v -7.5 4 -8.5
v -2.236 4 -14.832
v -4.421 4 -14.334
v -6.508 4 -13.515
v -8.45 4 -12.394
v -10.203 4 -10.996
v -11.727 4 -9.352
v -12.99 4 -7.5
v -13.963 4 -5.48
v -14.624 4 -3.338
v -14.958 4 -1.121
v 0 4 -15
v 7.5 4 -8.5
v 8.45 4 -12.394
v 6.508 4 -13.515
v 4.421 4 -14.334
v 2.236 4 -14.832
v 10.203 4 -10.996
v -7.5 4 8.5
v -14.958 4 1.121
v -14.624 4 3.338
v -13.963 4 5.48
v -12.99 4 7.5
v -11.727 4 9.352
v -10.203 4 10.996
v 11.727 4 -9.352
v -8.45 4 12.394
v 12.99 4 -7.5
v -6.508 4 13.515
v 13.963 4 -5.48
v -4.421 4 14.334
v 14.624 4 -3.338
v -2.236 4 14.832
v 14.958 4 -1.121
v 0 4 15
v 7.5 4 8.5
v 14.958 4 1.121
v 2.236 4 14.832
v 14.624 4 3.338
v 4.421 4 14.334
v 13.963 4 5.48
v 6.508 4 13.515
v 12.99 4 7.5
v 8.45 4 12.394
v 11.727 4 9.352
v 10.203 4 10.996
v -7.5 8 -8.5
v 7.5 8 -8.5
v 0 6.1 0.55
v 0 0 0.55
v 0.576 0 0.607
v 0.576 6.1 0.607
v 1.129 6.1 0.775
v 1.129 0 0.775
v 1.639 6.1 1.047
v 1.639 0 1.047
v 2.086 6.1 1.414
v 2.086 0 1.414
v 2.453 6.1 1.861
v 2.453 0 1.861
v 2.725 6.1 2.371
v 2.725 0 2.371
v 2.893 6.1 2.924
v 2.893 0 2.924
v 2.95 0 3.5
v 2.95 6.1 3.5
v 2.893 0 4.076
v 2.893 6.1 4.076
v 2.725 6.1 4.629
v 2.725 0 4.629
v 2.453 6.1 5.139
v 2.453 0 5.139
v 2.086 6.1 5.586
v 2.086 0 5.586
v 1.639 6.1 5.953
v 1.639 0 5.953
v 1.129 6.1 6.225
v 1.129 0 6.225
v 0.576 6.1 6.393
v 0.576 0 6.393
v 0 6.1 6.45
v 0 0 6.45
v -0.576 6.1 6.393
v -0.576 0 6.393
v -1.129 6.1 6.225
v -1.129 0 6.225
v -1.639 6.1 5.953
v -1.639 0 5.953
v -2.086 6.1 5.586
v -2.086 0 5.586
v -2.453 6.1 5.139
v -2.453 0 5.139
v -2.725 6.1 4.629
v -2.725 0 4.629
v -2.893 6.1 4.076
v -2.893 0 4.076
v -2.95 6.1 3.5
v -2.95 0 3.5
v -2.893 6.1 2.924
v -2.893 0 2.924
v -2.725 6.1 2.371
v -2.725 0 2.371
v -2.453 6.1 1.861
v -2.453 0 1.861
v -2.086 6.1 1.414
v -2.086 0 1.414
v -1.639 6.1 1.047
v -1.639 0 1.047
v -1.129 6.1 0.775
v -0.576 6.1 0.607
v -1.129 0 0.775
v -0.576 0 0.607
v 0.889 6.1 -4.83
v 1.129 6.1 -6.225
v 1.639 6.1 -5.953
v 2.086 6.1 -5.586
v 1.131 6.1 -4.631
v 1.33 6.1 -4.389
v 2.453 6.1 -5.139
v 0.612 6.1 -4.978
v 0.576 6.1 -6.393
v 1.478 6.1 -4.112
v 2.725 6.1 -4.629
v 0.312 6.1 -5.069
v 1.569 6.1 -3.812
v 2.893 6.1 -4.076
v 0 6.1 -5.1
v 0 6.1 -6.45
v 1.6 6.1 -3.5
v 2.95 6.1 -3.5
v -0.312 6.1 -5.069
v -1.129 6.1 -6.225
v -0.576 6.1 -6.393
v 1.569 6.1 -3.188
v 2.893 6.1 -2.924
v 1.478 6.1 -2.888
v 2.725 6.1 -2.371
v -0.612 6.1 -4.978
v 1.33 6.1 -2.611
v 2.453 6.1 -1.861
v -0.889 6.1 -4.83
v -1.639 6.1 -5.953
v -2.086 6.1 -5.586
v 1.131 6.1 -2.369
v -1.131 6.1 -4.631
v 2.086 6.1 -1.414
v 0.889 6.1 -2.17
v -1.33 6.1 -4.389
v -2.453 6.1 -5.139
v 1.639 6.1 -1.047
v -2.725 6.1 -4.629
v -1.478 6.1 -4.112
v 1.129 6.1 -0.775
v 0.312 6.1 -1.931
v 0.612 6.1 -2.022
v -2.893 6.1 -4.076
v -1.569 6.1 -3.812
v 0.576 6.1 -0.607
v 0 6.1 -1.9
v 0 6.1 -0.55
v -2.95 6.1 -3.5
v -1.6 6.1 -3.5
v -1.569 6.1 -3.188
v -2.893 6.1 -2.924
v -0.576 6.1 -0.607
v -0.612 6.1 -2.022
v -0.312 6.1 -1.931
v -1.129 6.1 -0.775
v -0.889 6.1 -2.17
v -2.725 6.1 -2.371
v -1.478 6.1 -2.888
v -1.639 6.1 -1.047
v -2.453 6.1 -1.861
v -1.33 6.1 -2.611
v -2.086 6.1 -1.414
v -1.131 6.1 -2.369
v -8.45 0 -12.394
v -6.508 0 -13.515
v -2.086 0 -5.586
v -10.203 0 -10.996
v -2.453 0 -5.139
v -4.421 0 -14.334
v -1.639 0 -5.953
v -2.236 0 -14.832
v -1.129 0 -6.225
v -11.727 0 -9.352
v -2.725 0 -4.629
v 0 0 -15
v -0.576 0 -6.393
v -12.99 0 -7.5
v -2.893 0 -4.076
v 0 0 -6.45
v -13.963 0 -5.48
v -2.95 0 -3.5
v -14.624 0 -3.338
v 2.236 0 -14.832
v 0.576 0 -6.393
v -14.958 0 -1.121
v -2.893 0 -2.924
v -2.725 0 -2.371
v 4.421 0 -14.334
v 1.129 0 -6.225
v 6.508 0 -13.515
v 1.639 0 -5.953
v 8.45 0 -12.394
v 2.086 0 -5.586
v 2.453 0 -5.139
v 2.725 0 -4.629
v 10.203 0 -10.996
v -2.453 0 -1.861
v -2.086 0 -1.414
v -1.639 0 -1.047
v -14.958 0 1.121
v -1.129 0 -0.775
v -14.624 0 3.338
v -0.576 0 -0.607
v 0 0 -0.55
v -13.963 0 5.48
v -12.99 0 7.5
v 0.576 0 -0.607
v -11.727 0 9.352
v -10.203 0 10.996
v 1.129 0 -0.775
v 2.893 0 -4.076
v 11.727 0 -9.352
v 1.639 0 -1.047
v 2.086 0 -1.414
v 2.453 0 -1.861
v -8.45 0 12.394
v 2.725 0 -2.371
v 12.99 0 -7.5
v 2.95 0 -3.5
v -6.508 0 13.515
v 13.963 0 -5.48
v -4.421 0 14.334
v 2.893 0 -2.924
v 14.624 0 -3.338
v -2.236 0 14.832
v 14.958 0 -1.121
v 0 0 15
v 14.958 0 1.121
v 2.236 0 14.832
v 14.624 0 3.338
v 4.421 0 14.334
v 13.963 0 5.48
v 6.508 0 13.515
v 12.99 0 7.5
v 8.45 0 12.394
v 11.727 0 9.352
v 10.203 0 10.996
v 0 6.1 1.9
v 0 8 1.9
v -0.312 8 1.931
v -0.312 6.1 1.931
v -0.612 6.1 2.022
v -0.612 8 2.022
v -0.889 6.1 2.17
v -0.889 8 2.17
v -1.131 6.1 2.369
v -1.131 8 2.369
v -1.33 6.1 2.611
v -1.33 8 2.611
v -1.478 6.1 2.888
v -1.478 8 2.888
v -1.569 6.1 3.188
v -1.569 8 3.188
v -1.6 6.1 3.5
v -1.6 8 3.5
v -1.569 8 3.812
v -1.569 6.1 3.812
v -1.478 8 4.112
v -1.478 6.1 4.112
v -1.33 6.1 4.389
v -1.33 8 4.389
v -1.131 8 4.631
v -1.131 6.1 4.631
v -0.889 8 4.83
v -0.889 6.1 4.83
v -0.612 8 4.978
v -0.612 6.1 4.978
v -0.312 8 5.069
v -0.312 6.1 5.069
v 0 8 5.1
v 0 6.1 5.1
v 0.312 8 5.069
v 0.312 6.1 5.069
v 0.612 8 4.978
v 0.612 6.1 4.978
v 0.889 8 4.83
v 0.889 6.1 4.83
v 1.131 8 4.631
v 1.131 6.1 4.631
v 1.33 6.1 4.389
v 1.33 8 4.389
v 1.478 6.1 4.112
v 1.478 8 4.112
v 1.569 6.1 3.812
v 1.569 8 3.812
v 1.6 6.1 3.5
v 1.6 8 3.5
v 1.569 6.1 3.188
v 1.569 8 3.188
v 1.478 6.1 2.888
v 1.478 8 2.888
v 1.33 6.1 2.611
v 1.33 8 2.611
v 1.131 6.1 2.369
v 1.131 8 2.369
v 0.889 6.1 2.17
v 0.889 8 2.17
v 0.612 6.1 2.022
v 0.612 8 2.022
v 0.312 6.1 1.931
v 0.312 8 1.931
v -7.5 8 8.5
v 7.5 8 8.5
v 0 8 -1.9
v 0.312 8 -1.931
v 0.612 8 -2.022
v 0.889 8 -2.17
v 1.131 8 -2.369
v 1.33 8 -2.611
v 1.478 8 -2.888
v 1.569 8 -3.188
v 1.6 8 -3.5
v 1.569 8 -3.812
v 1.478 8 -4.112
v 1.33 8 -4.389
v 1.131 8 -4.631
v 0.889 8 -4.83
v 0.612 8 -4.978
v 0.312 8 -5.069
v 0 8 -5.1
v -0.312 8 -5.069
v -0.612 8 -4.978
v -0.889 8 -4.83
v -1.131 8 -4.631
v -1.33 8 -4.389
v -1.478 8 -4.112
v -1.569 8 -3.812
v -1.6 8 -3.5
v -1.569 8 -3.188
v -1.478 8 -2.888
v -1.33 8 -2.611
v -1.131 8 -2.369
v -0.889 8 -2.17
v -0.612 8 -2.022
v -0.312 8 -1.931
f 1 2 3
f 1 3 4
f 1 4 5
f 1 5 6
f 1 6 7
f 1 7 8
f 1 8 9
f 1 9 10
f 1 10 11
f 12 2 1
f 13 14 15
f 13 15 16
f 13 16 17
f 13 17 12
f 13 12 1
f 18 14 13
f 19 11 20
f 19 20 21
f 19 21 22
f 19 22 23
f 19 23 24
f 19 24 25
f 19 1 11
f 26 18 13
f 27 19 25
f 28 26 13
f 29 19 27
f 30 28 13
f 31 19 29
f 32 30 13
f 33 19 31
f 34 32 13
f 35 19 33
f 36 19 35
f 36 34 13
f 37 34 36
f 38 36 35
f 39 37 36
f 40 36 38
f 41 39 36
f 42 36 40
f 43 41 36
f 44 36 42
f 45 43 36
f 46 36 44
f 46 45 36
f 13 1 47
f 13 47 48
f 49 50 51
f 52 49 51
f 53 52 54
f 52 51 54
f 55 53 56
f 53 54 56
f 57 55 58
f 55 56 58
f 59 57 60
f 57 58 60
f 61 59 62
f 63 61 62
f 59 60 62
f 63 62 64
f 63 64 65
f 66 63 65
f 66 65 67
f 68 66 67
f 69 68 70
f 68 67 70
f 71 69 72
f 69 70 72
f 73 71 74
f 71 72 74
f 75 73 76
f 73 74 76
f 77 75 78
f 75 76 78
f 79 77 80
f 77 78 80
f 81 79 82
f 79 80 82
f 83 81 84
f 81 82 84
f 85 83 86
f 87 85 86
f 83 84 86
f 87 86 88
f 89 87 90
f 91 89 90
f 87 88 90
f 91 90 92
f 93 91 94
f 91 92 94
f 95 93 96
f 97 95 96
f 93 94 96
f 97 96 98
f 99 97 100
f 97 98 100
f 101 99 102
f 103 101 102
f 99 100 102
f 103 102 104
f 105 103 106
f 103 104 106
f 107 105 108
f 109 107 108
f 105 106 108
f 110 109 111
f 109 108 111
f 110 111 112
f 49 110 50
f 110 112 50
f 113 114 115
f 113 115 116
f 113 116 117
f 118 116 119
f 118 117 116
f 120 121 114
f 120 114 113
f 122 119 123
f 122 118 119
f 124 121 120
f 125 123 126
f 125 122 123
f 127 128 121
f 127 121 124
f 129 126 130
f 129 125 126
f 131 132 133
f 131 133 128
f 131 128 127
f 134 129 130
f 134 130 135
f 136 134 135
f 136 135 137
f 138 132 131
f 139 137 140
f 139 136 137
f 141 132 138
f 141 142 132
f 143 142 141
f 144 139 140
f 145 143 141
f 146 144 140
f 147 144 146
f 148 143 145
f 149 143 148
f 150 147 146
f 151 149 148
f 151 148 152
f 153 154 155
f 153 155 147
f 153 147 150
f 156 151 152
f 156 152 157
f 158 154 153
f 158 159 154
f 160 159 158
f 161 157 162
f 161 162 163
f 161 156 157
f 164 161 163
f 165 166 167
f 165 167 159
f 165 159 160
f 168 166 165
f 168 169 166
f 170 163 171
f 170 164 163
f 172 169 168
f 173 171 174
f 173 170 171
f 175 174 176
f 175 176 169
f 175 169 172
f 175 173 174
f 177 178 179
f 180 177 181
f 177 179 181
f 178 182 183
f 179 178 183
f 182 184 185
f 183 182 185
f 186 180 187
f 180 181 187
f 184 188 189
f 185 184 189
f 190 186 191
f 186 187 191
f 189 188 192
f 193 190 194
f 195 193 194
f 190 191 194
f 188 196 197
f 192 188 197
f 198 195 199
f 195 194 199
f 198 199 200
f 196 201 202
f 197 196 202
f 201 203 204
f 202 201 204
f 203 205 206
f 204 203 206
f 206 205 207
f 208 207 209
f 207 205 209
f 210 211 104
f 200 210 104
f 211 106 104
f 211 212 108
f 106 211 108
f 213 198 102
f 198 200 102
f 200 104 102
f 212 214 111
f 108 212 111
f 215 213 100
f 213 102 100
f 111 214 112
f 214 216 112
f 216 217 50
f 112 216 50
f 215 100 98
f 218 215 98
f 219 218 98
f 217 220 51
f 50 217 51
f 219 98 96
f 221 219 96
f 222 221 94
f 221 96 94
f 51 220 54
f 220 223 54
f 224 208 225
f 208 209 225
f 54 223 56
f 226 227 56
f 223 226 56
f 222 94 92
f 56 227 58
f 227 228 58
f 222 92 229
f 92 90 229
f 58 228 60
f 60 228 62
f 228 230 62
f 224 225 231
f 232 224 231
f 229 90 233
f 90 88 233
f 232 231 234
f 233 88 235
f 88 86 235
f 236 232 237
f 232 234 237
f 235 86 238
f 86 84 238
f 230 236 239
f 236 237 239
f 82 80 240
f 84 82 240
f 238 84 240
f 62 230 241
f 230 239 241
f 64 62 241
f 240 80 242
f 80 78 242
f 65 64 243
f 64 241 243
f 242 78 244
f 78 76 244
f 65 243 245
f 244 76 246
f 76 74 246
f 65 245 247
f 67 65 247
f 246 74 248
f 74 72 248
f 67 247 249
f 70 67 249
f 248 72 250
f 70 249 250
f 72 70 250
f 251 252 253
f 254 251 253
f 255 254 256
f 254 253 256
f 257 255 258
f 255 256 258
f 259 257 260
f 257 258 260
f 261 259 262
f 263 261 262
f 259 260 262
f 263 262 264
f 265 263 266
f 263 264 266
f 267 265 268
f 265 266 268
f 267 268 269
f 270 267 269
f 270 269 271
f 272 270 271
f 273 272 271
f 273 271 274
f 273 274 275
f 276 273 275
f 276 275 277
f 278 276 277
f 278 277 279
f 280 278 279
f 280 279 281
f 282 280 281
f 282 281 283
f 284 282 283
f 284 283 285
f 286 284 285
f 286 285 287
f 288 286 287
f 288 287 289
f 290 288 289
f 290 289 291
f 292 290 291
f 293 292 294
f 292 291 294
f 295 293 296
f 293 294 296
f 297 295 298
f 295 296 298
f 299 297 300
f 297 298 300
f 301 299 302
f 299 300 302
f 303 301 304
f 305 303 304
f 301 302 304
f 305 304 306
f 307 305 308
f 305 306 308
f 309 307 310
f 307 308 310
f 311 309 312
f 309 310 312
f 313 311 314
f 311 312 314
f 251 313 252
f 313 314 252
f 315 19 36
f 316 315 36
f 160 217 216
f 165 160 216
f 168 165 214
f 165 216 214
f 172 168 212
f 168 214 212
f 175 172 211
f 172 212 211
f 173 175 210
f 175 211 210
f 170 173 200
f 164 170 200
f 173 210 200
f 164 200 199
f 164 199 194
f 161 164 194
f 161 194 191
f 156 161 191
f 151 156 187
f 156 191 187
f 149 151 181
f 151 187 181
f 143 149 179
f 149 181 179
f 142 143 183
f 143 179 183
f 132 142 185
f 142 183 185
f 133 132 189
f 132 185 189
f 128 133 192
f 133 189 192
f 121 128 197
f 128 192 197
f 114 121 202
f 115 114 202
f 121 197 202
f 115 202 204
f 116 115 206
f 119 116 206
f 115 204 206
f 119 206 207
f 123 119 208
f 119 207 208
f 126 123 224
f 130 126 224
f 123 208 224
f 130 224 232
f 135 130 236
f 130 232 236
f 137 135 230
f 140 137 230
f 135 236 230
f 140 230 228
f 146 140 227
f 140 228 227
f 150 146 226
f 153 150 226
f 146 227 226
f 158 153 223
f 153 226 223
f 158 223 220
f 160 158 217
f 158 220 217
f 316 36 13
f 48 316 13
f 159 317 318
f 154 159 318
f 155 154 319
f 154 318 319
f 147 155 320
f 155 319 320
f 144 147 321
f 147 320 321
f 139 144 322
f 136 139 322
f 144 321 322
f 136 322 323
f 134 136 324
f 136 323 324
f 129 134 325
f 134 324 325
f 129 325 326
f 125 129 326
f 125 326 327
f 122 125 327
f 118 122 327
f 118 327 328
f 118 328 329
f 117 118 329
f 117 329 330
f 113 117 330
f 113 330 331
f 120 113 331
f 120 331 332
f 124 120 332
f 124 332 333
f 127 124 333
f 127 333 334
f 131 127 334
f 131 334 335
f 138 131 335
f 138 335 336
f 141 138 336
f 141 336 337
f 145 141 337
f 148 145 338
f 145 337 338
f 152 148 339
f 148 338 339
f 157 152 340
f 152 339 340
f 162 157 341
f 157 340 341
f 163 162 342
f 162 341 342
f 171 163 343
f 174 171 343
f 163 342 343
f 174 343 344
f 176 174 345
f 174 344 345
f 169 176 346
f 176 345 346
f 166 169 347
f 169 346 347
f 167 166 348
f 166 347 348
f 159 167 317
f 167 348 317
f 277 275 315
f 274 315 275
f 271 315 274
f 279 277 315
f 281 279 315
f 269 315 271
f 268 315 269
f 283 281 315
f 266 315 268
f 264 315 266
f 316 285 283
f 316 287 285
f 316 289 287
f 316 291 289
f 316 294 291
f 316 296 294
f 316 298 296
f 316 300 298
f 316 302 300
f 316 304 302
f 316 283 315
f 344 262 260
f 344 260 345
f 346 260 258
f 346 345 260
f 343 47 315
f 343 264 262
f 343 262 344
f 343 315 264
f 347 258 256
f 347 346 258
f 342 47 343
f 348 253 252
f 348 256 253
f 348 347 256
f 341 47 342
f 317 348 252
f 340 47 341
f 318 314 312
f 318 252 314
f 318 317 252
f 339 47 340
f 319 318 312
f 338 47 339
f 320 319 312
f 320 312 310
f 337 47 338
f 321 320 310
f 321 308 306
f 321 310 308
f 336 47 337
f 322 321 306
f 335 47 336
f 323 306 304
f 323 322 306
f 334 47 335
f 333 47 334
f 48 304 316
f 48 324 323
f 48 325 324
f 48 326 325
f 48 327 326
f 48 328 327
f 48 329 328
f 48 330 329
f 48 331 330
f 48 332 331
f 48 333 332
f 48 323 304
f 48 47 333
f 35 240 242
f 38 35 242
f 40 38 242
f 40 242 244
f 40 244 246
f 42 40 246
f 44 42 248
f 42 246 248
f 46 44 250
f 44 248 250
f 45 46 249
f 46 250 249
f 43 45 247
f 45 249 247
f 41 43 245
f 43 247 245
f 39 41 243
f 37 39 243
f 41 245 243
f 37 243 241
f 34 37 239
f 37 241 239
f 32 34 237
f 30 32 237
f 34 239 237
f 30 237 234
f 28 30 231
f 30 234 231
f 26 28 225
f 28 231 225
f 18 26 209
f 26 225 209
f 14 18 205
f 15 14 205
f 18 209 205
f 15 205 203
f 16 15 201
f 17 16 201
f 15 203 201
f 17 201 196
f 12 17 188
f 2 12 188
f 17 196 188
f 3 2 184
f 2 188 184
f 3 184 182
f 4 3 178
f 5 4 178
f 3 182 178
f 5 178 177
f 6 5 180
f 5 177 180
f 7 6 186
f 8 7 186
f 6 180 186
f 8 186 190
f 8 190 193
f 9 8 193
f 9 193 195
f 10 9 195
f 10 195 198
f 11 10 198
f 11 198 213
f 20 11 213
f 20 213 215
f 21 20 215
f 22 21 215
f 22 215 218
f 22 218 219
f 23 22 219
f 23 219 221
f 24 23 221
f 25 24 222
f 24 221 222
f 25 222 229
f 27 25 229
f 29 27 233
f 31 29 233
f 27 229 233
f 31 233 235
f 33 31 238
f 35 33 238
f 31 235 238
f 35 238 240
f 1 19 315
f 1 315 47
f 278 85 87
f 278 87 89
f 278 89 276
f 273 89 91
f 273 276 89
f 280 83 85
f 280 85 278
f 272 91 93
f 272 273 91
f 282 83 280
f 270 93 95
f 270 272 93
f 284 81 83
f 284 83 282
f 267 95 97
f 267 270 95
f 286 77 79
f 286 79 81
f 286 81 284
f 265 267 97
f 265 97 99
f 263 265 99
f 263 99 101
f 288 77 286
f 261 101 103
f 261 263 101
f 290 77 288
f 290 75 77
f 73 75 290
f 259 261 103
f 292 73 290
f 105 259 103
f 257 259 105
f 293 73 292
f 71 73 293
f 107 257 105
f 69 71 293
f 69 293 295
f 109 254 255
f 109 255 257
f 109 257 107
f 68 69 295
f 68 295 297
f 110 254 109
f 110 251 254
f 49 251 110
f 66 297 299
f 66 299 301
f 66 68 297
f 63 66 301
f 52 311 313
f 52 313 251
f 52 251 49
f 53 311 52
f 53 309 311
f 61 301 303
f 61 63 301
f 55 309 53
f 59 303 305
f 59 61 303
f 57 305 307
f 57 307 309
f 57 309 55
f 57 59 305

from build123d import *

# Parameters (mm, degrees)
SKETCH2_R           = 15
BOSS_EXTRUDE1_DEPTH = 4
SKETCH3_W           = 15
SKETCH3_H           = 17
BOSS_EXTRUDE2_DEPTH = 4
SKETCH4_R           = 1.6
CUT_EXTRUDE1_DEPTH  = 23.671568098
SKETCH5_R           = 2.95
CUT_EXTRUDE2_DEPTH  = 6.1


with BuildPart() as part:
    # Sketch2 → Boss-Extrude1 (new body)
    with BuildSketch(Plane(origin=(0, 0, 0), x_dir=(1, 0, 0), z_dir=(0, 1, 0))):
        with Locations(Location((0, 0, 0), (0, 0, 270))):
            Circle(SKETCH2_R)
    extrude(amount=BOSS_EXTRUDE1_DEPTH)

    # Sketch3 → Boss-Extrude2 (add)
    with BuildSketch(Plane(origin=(0, 4, 0), x_dir=(1, 0, 0), z_dir=(0, 1, 0))):
        Rectangle(SKETCH3_W, SKETCH3_H)
    extrude(amount=BOSS_EXTRUDE2_DEPTH)

    # Sketch4 → Cut-Extrude1 (cut, through all)
    with BuildSketch(Plane(origin=(0, 8, 0), x_dir=(1, 0, 0), z_dir=(0, 1, 0))):
        with Locations(Location((0, 3.5, 0), (0, 0, 270))):
            Circle(SKETCH4_R)
        with Locations(Location((0, -3.5, 0), (0, 0, 90))):
            Circle(SKETCH4_R)
    extrude(amount=-CUT_EXTRUDE1_DEPTH, mode=Mode.SUBTRACT)

    # Sketch5 → Cut-Extrude2 (cut)
    with BuildSketch(Plane.XZ):
        with Locations(Location((0, 3.5, 0), (0, 0, 270))):
            Circle(SKETCH5_R)
        with Locations(Location((0, -3.5, 0), (0, 0, 90))):
            Circle(SKETCH5_R)
    extrude(amount=-CUT_EXTRUDE2_DEPTH, mode=Mode.SUBTRACT)


solid = part.part
